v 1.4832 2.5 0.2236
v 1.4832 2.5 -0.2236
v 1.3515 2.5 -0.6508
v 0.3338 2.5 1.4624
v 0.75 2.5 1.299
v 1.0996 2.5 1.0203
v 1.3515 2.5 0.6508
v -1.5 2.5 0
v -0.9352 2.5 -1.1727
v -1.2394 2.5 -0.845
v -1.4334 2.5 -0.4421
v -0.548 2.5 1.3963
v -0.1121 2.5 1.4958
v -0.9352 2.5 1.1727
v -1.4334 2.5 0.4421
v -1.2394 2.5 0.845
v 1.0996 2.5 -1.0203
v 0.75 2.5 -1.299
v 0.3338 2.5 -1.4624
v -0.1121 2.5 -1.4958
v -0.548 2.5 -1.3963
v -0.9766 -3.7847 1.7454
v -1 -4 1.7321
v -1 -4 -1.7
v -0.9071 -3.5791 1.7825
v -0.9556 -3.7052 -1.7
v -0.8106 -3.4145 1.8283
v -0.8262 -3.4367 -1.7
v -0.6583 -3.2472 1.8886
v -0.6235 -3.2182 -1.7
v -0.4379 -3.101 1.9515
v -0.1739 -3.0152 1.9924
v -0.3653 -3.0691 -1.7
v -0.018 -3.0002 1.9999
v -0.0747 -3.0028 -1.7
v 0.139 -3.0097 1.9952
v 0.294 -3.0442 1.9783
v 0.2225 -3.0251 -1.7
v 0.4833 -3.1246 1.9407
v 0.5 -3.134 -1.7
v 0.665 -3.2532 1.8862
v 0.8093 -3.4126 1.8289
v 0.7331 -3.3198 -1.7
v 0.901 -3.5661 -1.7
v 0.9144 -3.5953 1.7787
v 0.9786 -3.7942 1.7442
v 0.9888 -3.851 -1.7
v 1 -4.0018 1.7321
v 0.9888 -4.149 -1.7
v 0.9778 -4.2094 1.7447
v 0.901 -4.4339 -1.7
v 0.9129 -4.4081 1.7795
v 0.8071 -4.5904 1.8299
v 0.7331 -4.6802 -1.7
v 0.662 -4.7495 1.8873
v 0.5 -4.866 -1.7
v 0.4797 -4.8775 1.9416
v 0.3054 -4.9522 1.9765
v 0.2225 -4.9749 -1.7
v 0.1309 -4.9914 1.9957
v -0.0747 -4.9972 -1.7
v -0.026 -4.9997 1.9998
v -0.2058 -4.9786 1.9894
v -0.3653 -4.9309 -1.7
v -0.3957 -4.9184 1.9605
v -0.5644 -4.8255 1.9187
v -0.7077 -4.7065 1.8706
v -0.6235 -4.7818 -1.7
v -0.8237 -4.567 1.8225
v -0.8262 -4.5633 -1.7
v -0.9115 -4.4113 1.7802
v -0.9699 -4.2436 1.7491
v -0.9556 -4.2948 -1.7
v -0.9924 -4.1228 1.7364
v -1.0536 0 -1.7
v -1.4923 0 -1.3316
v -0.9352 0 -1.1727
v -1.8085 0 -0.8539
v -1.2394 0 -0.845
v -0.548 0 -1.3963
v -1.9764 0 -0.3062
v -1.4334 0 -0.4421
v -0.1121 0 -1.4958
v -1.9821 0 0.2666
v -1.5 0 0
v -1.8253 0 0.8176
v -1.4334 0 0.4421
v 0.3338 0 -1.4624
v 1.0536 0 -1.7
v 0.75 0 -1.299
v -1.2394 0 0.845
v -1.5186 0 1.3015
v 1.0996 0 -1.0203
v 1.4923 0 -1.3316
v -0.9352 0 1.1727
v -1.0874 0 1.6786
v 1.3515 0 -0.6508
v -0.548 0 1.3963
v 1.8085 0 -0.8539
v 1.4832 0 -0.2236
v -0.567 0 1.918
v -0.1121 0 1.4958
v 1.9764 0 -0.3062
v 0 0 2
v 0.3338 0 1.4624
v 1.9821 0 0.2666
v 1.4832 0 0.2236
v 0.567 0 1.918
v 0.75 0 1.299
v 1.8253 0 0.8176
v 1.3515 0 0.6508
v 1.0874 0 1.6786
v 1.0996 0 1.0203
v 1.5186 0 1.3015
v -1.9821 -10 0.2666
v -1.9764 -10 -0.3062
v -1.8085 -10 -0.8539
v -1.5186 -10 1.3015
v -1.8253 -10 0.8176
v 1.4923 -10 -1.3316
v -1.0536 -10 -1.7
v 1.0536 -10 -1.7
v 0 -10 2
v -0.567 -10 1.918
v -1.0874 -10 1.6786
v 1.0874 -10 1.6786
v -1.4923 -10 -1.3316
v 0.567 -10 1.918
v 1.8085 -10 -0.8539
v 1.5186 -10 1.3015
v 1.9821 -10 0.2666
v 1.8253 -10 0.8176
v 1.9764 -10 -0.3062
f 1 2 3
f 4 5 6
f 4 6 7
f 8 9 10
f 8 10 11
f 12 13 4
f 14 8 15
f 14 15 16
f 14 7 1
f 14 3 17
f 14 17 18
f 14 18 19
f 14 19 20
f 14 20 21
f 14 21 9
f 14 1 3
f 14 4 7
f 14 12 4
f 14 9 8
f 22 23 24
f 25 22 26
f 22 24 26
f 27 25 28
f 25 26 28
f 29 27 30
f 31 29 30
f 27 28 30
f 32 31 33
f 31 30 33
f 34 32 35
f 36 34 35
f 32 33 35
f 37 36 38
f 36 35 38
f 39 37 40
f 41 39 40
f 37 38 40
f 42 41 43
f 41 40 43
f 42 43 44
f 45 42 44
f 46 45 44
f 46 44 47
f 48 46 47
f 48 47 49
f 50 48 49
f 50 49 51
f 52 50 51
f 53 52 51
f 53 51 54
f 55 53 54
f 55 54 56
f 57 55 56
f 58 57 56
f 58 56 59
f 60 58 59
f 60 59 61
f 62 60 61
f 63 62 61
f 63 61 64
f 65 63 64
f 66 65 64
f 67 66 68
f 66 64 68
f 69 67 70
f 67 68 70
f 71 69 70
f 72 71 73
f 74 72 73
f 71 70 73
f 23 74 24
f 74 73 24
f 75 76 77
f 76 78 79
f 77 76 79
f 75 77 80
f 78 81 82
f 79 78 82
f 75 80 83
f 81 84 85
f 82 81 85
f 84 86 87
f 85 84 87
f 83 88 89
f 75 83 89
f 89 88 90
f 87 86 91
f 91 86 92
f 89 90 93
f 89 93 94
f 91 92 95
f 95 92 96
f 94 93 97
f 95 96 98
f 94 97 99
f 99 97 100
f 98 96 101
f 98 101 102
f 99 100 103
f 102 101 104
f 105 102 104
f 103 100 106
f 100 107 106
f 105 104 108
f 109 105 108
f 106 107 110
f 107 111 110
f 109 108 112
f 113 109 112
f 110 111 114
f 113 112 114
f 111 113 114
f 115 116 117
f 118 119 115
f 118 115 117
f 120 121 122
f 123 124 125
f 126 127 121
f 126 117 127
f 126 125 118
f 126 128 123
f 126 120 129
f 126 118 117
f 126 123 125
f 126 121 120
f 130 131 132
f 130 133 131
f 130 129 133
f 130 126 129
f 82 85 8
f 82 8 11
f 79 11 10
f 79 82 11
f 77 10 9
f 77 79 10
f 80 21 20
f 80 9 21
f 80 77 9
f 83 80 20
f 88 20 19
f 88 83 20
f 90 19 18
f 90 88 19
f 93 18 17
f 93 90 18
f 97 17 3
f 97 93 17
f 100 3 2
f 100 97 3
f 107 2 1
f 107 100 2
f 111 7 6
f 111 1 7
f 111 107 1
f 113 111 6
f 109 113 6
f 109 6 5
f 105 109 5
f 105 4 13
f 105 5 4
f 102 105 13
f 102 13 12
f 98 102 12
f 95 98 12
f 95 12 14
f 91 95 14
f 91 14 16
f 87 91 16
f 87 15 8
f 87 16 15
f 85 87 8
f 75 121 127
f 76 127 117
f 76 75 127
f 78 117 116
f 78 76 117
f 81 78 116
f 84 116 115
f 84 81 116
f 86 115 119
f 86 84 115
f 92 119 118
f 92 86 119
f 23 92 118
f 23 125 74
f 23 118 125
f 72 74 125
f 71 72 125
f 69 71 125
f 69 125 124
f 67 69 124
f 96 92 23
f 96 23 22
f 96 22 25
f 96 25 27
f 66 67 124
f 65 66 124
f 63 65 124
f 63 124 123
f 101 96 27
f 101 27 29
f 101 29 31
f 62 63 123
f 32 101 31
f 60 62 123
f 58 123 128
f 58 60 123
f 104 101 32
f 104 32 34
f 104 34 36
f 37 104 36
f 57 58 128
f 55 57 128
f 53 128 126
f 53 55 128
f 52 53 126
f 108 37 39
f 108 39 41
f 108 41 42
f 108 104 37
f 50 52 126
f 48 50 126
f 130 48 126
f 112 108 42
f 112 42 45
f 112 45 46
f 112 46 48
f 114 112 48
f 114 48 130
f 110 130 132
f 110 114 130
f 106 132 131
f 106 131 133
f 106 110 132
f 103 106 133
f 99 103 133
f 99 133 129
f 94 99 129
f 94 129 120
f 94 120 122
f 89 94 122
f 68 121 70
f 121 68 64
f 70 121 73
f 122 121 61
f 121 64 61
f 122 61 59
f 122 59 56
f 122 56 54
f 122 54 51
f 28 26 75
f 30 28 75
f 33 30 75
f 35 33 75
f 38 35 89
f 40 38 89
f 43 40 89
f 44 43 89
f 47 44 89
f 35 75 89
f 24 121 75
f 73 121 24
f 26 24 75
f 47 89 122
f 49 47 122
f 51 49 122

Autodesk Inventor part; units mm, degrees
ref_plane "YZ Plane" through (0, 0, 0) normal (1, 0, 0) x (0, 1, 0)
ref_plane "XZ Plane" through (0, 0, 0) normal (0, 1, 0) x (-1, 0, 0)
ref_plane "XY Plane" through (0, 0, 0) normal (0, 0, 1) x (1, 0, 0)
sketch "スケッチ1" plane through (0, 0, 0) normal (0, 1, 0) x (-1, 0, 0)
  circle A0 centre (0, 0) radius 1.5
  dimension "d0" = 3
extrude "押し出し1" add sketch "スケッチ1" along normal blind 2.5
thread "ねじ1" size "M3x0.5" class "6g" standard "ANSI Metric M Profile" full length
sketch "スケッチ2" plane through (0, 0, 0) normal (0, -1, 0) x (1, 0, 0)
  circle A0 centre (0, 0) radius 2
  line L0 (0, -2) -> (0, -1.7)
  line L1 (0, -1.7) -> (-1.0536, -1.7)
  line L2 (0, -1.7) -> (1.0536, -1.7)
  dimension "d5" = 4
  dimension "d6" = 0.3
extrude "押し出し2" add sketch "スケッチ2" along normal blind 10 contours A0 L2 L1
sketch "スケッチ3" plane through (1.0536, 0, -1.7) normal (0, 0, -1) x (-1, 0, 0)
  circle A0 centre (1.0536, -4) radius 1
  line L0 (2.1071, 0) -> (0, 0) projected
  point P0 (1.0536, 0)
  dimension "d9" = 2
  dimension "d10" = 4
extrude "押し出し3" cut sketch "スケッチ3" against normal blind 10
properties part number "shaftcranp"
